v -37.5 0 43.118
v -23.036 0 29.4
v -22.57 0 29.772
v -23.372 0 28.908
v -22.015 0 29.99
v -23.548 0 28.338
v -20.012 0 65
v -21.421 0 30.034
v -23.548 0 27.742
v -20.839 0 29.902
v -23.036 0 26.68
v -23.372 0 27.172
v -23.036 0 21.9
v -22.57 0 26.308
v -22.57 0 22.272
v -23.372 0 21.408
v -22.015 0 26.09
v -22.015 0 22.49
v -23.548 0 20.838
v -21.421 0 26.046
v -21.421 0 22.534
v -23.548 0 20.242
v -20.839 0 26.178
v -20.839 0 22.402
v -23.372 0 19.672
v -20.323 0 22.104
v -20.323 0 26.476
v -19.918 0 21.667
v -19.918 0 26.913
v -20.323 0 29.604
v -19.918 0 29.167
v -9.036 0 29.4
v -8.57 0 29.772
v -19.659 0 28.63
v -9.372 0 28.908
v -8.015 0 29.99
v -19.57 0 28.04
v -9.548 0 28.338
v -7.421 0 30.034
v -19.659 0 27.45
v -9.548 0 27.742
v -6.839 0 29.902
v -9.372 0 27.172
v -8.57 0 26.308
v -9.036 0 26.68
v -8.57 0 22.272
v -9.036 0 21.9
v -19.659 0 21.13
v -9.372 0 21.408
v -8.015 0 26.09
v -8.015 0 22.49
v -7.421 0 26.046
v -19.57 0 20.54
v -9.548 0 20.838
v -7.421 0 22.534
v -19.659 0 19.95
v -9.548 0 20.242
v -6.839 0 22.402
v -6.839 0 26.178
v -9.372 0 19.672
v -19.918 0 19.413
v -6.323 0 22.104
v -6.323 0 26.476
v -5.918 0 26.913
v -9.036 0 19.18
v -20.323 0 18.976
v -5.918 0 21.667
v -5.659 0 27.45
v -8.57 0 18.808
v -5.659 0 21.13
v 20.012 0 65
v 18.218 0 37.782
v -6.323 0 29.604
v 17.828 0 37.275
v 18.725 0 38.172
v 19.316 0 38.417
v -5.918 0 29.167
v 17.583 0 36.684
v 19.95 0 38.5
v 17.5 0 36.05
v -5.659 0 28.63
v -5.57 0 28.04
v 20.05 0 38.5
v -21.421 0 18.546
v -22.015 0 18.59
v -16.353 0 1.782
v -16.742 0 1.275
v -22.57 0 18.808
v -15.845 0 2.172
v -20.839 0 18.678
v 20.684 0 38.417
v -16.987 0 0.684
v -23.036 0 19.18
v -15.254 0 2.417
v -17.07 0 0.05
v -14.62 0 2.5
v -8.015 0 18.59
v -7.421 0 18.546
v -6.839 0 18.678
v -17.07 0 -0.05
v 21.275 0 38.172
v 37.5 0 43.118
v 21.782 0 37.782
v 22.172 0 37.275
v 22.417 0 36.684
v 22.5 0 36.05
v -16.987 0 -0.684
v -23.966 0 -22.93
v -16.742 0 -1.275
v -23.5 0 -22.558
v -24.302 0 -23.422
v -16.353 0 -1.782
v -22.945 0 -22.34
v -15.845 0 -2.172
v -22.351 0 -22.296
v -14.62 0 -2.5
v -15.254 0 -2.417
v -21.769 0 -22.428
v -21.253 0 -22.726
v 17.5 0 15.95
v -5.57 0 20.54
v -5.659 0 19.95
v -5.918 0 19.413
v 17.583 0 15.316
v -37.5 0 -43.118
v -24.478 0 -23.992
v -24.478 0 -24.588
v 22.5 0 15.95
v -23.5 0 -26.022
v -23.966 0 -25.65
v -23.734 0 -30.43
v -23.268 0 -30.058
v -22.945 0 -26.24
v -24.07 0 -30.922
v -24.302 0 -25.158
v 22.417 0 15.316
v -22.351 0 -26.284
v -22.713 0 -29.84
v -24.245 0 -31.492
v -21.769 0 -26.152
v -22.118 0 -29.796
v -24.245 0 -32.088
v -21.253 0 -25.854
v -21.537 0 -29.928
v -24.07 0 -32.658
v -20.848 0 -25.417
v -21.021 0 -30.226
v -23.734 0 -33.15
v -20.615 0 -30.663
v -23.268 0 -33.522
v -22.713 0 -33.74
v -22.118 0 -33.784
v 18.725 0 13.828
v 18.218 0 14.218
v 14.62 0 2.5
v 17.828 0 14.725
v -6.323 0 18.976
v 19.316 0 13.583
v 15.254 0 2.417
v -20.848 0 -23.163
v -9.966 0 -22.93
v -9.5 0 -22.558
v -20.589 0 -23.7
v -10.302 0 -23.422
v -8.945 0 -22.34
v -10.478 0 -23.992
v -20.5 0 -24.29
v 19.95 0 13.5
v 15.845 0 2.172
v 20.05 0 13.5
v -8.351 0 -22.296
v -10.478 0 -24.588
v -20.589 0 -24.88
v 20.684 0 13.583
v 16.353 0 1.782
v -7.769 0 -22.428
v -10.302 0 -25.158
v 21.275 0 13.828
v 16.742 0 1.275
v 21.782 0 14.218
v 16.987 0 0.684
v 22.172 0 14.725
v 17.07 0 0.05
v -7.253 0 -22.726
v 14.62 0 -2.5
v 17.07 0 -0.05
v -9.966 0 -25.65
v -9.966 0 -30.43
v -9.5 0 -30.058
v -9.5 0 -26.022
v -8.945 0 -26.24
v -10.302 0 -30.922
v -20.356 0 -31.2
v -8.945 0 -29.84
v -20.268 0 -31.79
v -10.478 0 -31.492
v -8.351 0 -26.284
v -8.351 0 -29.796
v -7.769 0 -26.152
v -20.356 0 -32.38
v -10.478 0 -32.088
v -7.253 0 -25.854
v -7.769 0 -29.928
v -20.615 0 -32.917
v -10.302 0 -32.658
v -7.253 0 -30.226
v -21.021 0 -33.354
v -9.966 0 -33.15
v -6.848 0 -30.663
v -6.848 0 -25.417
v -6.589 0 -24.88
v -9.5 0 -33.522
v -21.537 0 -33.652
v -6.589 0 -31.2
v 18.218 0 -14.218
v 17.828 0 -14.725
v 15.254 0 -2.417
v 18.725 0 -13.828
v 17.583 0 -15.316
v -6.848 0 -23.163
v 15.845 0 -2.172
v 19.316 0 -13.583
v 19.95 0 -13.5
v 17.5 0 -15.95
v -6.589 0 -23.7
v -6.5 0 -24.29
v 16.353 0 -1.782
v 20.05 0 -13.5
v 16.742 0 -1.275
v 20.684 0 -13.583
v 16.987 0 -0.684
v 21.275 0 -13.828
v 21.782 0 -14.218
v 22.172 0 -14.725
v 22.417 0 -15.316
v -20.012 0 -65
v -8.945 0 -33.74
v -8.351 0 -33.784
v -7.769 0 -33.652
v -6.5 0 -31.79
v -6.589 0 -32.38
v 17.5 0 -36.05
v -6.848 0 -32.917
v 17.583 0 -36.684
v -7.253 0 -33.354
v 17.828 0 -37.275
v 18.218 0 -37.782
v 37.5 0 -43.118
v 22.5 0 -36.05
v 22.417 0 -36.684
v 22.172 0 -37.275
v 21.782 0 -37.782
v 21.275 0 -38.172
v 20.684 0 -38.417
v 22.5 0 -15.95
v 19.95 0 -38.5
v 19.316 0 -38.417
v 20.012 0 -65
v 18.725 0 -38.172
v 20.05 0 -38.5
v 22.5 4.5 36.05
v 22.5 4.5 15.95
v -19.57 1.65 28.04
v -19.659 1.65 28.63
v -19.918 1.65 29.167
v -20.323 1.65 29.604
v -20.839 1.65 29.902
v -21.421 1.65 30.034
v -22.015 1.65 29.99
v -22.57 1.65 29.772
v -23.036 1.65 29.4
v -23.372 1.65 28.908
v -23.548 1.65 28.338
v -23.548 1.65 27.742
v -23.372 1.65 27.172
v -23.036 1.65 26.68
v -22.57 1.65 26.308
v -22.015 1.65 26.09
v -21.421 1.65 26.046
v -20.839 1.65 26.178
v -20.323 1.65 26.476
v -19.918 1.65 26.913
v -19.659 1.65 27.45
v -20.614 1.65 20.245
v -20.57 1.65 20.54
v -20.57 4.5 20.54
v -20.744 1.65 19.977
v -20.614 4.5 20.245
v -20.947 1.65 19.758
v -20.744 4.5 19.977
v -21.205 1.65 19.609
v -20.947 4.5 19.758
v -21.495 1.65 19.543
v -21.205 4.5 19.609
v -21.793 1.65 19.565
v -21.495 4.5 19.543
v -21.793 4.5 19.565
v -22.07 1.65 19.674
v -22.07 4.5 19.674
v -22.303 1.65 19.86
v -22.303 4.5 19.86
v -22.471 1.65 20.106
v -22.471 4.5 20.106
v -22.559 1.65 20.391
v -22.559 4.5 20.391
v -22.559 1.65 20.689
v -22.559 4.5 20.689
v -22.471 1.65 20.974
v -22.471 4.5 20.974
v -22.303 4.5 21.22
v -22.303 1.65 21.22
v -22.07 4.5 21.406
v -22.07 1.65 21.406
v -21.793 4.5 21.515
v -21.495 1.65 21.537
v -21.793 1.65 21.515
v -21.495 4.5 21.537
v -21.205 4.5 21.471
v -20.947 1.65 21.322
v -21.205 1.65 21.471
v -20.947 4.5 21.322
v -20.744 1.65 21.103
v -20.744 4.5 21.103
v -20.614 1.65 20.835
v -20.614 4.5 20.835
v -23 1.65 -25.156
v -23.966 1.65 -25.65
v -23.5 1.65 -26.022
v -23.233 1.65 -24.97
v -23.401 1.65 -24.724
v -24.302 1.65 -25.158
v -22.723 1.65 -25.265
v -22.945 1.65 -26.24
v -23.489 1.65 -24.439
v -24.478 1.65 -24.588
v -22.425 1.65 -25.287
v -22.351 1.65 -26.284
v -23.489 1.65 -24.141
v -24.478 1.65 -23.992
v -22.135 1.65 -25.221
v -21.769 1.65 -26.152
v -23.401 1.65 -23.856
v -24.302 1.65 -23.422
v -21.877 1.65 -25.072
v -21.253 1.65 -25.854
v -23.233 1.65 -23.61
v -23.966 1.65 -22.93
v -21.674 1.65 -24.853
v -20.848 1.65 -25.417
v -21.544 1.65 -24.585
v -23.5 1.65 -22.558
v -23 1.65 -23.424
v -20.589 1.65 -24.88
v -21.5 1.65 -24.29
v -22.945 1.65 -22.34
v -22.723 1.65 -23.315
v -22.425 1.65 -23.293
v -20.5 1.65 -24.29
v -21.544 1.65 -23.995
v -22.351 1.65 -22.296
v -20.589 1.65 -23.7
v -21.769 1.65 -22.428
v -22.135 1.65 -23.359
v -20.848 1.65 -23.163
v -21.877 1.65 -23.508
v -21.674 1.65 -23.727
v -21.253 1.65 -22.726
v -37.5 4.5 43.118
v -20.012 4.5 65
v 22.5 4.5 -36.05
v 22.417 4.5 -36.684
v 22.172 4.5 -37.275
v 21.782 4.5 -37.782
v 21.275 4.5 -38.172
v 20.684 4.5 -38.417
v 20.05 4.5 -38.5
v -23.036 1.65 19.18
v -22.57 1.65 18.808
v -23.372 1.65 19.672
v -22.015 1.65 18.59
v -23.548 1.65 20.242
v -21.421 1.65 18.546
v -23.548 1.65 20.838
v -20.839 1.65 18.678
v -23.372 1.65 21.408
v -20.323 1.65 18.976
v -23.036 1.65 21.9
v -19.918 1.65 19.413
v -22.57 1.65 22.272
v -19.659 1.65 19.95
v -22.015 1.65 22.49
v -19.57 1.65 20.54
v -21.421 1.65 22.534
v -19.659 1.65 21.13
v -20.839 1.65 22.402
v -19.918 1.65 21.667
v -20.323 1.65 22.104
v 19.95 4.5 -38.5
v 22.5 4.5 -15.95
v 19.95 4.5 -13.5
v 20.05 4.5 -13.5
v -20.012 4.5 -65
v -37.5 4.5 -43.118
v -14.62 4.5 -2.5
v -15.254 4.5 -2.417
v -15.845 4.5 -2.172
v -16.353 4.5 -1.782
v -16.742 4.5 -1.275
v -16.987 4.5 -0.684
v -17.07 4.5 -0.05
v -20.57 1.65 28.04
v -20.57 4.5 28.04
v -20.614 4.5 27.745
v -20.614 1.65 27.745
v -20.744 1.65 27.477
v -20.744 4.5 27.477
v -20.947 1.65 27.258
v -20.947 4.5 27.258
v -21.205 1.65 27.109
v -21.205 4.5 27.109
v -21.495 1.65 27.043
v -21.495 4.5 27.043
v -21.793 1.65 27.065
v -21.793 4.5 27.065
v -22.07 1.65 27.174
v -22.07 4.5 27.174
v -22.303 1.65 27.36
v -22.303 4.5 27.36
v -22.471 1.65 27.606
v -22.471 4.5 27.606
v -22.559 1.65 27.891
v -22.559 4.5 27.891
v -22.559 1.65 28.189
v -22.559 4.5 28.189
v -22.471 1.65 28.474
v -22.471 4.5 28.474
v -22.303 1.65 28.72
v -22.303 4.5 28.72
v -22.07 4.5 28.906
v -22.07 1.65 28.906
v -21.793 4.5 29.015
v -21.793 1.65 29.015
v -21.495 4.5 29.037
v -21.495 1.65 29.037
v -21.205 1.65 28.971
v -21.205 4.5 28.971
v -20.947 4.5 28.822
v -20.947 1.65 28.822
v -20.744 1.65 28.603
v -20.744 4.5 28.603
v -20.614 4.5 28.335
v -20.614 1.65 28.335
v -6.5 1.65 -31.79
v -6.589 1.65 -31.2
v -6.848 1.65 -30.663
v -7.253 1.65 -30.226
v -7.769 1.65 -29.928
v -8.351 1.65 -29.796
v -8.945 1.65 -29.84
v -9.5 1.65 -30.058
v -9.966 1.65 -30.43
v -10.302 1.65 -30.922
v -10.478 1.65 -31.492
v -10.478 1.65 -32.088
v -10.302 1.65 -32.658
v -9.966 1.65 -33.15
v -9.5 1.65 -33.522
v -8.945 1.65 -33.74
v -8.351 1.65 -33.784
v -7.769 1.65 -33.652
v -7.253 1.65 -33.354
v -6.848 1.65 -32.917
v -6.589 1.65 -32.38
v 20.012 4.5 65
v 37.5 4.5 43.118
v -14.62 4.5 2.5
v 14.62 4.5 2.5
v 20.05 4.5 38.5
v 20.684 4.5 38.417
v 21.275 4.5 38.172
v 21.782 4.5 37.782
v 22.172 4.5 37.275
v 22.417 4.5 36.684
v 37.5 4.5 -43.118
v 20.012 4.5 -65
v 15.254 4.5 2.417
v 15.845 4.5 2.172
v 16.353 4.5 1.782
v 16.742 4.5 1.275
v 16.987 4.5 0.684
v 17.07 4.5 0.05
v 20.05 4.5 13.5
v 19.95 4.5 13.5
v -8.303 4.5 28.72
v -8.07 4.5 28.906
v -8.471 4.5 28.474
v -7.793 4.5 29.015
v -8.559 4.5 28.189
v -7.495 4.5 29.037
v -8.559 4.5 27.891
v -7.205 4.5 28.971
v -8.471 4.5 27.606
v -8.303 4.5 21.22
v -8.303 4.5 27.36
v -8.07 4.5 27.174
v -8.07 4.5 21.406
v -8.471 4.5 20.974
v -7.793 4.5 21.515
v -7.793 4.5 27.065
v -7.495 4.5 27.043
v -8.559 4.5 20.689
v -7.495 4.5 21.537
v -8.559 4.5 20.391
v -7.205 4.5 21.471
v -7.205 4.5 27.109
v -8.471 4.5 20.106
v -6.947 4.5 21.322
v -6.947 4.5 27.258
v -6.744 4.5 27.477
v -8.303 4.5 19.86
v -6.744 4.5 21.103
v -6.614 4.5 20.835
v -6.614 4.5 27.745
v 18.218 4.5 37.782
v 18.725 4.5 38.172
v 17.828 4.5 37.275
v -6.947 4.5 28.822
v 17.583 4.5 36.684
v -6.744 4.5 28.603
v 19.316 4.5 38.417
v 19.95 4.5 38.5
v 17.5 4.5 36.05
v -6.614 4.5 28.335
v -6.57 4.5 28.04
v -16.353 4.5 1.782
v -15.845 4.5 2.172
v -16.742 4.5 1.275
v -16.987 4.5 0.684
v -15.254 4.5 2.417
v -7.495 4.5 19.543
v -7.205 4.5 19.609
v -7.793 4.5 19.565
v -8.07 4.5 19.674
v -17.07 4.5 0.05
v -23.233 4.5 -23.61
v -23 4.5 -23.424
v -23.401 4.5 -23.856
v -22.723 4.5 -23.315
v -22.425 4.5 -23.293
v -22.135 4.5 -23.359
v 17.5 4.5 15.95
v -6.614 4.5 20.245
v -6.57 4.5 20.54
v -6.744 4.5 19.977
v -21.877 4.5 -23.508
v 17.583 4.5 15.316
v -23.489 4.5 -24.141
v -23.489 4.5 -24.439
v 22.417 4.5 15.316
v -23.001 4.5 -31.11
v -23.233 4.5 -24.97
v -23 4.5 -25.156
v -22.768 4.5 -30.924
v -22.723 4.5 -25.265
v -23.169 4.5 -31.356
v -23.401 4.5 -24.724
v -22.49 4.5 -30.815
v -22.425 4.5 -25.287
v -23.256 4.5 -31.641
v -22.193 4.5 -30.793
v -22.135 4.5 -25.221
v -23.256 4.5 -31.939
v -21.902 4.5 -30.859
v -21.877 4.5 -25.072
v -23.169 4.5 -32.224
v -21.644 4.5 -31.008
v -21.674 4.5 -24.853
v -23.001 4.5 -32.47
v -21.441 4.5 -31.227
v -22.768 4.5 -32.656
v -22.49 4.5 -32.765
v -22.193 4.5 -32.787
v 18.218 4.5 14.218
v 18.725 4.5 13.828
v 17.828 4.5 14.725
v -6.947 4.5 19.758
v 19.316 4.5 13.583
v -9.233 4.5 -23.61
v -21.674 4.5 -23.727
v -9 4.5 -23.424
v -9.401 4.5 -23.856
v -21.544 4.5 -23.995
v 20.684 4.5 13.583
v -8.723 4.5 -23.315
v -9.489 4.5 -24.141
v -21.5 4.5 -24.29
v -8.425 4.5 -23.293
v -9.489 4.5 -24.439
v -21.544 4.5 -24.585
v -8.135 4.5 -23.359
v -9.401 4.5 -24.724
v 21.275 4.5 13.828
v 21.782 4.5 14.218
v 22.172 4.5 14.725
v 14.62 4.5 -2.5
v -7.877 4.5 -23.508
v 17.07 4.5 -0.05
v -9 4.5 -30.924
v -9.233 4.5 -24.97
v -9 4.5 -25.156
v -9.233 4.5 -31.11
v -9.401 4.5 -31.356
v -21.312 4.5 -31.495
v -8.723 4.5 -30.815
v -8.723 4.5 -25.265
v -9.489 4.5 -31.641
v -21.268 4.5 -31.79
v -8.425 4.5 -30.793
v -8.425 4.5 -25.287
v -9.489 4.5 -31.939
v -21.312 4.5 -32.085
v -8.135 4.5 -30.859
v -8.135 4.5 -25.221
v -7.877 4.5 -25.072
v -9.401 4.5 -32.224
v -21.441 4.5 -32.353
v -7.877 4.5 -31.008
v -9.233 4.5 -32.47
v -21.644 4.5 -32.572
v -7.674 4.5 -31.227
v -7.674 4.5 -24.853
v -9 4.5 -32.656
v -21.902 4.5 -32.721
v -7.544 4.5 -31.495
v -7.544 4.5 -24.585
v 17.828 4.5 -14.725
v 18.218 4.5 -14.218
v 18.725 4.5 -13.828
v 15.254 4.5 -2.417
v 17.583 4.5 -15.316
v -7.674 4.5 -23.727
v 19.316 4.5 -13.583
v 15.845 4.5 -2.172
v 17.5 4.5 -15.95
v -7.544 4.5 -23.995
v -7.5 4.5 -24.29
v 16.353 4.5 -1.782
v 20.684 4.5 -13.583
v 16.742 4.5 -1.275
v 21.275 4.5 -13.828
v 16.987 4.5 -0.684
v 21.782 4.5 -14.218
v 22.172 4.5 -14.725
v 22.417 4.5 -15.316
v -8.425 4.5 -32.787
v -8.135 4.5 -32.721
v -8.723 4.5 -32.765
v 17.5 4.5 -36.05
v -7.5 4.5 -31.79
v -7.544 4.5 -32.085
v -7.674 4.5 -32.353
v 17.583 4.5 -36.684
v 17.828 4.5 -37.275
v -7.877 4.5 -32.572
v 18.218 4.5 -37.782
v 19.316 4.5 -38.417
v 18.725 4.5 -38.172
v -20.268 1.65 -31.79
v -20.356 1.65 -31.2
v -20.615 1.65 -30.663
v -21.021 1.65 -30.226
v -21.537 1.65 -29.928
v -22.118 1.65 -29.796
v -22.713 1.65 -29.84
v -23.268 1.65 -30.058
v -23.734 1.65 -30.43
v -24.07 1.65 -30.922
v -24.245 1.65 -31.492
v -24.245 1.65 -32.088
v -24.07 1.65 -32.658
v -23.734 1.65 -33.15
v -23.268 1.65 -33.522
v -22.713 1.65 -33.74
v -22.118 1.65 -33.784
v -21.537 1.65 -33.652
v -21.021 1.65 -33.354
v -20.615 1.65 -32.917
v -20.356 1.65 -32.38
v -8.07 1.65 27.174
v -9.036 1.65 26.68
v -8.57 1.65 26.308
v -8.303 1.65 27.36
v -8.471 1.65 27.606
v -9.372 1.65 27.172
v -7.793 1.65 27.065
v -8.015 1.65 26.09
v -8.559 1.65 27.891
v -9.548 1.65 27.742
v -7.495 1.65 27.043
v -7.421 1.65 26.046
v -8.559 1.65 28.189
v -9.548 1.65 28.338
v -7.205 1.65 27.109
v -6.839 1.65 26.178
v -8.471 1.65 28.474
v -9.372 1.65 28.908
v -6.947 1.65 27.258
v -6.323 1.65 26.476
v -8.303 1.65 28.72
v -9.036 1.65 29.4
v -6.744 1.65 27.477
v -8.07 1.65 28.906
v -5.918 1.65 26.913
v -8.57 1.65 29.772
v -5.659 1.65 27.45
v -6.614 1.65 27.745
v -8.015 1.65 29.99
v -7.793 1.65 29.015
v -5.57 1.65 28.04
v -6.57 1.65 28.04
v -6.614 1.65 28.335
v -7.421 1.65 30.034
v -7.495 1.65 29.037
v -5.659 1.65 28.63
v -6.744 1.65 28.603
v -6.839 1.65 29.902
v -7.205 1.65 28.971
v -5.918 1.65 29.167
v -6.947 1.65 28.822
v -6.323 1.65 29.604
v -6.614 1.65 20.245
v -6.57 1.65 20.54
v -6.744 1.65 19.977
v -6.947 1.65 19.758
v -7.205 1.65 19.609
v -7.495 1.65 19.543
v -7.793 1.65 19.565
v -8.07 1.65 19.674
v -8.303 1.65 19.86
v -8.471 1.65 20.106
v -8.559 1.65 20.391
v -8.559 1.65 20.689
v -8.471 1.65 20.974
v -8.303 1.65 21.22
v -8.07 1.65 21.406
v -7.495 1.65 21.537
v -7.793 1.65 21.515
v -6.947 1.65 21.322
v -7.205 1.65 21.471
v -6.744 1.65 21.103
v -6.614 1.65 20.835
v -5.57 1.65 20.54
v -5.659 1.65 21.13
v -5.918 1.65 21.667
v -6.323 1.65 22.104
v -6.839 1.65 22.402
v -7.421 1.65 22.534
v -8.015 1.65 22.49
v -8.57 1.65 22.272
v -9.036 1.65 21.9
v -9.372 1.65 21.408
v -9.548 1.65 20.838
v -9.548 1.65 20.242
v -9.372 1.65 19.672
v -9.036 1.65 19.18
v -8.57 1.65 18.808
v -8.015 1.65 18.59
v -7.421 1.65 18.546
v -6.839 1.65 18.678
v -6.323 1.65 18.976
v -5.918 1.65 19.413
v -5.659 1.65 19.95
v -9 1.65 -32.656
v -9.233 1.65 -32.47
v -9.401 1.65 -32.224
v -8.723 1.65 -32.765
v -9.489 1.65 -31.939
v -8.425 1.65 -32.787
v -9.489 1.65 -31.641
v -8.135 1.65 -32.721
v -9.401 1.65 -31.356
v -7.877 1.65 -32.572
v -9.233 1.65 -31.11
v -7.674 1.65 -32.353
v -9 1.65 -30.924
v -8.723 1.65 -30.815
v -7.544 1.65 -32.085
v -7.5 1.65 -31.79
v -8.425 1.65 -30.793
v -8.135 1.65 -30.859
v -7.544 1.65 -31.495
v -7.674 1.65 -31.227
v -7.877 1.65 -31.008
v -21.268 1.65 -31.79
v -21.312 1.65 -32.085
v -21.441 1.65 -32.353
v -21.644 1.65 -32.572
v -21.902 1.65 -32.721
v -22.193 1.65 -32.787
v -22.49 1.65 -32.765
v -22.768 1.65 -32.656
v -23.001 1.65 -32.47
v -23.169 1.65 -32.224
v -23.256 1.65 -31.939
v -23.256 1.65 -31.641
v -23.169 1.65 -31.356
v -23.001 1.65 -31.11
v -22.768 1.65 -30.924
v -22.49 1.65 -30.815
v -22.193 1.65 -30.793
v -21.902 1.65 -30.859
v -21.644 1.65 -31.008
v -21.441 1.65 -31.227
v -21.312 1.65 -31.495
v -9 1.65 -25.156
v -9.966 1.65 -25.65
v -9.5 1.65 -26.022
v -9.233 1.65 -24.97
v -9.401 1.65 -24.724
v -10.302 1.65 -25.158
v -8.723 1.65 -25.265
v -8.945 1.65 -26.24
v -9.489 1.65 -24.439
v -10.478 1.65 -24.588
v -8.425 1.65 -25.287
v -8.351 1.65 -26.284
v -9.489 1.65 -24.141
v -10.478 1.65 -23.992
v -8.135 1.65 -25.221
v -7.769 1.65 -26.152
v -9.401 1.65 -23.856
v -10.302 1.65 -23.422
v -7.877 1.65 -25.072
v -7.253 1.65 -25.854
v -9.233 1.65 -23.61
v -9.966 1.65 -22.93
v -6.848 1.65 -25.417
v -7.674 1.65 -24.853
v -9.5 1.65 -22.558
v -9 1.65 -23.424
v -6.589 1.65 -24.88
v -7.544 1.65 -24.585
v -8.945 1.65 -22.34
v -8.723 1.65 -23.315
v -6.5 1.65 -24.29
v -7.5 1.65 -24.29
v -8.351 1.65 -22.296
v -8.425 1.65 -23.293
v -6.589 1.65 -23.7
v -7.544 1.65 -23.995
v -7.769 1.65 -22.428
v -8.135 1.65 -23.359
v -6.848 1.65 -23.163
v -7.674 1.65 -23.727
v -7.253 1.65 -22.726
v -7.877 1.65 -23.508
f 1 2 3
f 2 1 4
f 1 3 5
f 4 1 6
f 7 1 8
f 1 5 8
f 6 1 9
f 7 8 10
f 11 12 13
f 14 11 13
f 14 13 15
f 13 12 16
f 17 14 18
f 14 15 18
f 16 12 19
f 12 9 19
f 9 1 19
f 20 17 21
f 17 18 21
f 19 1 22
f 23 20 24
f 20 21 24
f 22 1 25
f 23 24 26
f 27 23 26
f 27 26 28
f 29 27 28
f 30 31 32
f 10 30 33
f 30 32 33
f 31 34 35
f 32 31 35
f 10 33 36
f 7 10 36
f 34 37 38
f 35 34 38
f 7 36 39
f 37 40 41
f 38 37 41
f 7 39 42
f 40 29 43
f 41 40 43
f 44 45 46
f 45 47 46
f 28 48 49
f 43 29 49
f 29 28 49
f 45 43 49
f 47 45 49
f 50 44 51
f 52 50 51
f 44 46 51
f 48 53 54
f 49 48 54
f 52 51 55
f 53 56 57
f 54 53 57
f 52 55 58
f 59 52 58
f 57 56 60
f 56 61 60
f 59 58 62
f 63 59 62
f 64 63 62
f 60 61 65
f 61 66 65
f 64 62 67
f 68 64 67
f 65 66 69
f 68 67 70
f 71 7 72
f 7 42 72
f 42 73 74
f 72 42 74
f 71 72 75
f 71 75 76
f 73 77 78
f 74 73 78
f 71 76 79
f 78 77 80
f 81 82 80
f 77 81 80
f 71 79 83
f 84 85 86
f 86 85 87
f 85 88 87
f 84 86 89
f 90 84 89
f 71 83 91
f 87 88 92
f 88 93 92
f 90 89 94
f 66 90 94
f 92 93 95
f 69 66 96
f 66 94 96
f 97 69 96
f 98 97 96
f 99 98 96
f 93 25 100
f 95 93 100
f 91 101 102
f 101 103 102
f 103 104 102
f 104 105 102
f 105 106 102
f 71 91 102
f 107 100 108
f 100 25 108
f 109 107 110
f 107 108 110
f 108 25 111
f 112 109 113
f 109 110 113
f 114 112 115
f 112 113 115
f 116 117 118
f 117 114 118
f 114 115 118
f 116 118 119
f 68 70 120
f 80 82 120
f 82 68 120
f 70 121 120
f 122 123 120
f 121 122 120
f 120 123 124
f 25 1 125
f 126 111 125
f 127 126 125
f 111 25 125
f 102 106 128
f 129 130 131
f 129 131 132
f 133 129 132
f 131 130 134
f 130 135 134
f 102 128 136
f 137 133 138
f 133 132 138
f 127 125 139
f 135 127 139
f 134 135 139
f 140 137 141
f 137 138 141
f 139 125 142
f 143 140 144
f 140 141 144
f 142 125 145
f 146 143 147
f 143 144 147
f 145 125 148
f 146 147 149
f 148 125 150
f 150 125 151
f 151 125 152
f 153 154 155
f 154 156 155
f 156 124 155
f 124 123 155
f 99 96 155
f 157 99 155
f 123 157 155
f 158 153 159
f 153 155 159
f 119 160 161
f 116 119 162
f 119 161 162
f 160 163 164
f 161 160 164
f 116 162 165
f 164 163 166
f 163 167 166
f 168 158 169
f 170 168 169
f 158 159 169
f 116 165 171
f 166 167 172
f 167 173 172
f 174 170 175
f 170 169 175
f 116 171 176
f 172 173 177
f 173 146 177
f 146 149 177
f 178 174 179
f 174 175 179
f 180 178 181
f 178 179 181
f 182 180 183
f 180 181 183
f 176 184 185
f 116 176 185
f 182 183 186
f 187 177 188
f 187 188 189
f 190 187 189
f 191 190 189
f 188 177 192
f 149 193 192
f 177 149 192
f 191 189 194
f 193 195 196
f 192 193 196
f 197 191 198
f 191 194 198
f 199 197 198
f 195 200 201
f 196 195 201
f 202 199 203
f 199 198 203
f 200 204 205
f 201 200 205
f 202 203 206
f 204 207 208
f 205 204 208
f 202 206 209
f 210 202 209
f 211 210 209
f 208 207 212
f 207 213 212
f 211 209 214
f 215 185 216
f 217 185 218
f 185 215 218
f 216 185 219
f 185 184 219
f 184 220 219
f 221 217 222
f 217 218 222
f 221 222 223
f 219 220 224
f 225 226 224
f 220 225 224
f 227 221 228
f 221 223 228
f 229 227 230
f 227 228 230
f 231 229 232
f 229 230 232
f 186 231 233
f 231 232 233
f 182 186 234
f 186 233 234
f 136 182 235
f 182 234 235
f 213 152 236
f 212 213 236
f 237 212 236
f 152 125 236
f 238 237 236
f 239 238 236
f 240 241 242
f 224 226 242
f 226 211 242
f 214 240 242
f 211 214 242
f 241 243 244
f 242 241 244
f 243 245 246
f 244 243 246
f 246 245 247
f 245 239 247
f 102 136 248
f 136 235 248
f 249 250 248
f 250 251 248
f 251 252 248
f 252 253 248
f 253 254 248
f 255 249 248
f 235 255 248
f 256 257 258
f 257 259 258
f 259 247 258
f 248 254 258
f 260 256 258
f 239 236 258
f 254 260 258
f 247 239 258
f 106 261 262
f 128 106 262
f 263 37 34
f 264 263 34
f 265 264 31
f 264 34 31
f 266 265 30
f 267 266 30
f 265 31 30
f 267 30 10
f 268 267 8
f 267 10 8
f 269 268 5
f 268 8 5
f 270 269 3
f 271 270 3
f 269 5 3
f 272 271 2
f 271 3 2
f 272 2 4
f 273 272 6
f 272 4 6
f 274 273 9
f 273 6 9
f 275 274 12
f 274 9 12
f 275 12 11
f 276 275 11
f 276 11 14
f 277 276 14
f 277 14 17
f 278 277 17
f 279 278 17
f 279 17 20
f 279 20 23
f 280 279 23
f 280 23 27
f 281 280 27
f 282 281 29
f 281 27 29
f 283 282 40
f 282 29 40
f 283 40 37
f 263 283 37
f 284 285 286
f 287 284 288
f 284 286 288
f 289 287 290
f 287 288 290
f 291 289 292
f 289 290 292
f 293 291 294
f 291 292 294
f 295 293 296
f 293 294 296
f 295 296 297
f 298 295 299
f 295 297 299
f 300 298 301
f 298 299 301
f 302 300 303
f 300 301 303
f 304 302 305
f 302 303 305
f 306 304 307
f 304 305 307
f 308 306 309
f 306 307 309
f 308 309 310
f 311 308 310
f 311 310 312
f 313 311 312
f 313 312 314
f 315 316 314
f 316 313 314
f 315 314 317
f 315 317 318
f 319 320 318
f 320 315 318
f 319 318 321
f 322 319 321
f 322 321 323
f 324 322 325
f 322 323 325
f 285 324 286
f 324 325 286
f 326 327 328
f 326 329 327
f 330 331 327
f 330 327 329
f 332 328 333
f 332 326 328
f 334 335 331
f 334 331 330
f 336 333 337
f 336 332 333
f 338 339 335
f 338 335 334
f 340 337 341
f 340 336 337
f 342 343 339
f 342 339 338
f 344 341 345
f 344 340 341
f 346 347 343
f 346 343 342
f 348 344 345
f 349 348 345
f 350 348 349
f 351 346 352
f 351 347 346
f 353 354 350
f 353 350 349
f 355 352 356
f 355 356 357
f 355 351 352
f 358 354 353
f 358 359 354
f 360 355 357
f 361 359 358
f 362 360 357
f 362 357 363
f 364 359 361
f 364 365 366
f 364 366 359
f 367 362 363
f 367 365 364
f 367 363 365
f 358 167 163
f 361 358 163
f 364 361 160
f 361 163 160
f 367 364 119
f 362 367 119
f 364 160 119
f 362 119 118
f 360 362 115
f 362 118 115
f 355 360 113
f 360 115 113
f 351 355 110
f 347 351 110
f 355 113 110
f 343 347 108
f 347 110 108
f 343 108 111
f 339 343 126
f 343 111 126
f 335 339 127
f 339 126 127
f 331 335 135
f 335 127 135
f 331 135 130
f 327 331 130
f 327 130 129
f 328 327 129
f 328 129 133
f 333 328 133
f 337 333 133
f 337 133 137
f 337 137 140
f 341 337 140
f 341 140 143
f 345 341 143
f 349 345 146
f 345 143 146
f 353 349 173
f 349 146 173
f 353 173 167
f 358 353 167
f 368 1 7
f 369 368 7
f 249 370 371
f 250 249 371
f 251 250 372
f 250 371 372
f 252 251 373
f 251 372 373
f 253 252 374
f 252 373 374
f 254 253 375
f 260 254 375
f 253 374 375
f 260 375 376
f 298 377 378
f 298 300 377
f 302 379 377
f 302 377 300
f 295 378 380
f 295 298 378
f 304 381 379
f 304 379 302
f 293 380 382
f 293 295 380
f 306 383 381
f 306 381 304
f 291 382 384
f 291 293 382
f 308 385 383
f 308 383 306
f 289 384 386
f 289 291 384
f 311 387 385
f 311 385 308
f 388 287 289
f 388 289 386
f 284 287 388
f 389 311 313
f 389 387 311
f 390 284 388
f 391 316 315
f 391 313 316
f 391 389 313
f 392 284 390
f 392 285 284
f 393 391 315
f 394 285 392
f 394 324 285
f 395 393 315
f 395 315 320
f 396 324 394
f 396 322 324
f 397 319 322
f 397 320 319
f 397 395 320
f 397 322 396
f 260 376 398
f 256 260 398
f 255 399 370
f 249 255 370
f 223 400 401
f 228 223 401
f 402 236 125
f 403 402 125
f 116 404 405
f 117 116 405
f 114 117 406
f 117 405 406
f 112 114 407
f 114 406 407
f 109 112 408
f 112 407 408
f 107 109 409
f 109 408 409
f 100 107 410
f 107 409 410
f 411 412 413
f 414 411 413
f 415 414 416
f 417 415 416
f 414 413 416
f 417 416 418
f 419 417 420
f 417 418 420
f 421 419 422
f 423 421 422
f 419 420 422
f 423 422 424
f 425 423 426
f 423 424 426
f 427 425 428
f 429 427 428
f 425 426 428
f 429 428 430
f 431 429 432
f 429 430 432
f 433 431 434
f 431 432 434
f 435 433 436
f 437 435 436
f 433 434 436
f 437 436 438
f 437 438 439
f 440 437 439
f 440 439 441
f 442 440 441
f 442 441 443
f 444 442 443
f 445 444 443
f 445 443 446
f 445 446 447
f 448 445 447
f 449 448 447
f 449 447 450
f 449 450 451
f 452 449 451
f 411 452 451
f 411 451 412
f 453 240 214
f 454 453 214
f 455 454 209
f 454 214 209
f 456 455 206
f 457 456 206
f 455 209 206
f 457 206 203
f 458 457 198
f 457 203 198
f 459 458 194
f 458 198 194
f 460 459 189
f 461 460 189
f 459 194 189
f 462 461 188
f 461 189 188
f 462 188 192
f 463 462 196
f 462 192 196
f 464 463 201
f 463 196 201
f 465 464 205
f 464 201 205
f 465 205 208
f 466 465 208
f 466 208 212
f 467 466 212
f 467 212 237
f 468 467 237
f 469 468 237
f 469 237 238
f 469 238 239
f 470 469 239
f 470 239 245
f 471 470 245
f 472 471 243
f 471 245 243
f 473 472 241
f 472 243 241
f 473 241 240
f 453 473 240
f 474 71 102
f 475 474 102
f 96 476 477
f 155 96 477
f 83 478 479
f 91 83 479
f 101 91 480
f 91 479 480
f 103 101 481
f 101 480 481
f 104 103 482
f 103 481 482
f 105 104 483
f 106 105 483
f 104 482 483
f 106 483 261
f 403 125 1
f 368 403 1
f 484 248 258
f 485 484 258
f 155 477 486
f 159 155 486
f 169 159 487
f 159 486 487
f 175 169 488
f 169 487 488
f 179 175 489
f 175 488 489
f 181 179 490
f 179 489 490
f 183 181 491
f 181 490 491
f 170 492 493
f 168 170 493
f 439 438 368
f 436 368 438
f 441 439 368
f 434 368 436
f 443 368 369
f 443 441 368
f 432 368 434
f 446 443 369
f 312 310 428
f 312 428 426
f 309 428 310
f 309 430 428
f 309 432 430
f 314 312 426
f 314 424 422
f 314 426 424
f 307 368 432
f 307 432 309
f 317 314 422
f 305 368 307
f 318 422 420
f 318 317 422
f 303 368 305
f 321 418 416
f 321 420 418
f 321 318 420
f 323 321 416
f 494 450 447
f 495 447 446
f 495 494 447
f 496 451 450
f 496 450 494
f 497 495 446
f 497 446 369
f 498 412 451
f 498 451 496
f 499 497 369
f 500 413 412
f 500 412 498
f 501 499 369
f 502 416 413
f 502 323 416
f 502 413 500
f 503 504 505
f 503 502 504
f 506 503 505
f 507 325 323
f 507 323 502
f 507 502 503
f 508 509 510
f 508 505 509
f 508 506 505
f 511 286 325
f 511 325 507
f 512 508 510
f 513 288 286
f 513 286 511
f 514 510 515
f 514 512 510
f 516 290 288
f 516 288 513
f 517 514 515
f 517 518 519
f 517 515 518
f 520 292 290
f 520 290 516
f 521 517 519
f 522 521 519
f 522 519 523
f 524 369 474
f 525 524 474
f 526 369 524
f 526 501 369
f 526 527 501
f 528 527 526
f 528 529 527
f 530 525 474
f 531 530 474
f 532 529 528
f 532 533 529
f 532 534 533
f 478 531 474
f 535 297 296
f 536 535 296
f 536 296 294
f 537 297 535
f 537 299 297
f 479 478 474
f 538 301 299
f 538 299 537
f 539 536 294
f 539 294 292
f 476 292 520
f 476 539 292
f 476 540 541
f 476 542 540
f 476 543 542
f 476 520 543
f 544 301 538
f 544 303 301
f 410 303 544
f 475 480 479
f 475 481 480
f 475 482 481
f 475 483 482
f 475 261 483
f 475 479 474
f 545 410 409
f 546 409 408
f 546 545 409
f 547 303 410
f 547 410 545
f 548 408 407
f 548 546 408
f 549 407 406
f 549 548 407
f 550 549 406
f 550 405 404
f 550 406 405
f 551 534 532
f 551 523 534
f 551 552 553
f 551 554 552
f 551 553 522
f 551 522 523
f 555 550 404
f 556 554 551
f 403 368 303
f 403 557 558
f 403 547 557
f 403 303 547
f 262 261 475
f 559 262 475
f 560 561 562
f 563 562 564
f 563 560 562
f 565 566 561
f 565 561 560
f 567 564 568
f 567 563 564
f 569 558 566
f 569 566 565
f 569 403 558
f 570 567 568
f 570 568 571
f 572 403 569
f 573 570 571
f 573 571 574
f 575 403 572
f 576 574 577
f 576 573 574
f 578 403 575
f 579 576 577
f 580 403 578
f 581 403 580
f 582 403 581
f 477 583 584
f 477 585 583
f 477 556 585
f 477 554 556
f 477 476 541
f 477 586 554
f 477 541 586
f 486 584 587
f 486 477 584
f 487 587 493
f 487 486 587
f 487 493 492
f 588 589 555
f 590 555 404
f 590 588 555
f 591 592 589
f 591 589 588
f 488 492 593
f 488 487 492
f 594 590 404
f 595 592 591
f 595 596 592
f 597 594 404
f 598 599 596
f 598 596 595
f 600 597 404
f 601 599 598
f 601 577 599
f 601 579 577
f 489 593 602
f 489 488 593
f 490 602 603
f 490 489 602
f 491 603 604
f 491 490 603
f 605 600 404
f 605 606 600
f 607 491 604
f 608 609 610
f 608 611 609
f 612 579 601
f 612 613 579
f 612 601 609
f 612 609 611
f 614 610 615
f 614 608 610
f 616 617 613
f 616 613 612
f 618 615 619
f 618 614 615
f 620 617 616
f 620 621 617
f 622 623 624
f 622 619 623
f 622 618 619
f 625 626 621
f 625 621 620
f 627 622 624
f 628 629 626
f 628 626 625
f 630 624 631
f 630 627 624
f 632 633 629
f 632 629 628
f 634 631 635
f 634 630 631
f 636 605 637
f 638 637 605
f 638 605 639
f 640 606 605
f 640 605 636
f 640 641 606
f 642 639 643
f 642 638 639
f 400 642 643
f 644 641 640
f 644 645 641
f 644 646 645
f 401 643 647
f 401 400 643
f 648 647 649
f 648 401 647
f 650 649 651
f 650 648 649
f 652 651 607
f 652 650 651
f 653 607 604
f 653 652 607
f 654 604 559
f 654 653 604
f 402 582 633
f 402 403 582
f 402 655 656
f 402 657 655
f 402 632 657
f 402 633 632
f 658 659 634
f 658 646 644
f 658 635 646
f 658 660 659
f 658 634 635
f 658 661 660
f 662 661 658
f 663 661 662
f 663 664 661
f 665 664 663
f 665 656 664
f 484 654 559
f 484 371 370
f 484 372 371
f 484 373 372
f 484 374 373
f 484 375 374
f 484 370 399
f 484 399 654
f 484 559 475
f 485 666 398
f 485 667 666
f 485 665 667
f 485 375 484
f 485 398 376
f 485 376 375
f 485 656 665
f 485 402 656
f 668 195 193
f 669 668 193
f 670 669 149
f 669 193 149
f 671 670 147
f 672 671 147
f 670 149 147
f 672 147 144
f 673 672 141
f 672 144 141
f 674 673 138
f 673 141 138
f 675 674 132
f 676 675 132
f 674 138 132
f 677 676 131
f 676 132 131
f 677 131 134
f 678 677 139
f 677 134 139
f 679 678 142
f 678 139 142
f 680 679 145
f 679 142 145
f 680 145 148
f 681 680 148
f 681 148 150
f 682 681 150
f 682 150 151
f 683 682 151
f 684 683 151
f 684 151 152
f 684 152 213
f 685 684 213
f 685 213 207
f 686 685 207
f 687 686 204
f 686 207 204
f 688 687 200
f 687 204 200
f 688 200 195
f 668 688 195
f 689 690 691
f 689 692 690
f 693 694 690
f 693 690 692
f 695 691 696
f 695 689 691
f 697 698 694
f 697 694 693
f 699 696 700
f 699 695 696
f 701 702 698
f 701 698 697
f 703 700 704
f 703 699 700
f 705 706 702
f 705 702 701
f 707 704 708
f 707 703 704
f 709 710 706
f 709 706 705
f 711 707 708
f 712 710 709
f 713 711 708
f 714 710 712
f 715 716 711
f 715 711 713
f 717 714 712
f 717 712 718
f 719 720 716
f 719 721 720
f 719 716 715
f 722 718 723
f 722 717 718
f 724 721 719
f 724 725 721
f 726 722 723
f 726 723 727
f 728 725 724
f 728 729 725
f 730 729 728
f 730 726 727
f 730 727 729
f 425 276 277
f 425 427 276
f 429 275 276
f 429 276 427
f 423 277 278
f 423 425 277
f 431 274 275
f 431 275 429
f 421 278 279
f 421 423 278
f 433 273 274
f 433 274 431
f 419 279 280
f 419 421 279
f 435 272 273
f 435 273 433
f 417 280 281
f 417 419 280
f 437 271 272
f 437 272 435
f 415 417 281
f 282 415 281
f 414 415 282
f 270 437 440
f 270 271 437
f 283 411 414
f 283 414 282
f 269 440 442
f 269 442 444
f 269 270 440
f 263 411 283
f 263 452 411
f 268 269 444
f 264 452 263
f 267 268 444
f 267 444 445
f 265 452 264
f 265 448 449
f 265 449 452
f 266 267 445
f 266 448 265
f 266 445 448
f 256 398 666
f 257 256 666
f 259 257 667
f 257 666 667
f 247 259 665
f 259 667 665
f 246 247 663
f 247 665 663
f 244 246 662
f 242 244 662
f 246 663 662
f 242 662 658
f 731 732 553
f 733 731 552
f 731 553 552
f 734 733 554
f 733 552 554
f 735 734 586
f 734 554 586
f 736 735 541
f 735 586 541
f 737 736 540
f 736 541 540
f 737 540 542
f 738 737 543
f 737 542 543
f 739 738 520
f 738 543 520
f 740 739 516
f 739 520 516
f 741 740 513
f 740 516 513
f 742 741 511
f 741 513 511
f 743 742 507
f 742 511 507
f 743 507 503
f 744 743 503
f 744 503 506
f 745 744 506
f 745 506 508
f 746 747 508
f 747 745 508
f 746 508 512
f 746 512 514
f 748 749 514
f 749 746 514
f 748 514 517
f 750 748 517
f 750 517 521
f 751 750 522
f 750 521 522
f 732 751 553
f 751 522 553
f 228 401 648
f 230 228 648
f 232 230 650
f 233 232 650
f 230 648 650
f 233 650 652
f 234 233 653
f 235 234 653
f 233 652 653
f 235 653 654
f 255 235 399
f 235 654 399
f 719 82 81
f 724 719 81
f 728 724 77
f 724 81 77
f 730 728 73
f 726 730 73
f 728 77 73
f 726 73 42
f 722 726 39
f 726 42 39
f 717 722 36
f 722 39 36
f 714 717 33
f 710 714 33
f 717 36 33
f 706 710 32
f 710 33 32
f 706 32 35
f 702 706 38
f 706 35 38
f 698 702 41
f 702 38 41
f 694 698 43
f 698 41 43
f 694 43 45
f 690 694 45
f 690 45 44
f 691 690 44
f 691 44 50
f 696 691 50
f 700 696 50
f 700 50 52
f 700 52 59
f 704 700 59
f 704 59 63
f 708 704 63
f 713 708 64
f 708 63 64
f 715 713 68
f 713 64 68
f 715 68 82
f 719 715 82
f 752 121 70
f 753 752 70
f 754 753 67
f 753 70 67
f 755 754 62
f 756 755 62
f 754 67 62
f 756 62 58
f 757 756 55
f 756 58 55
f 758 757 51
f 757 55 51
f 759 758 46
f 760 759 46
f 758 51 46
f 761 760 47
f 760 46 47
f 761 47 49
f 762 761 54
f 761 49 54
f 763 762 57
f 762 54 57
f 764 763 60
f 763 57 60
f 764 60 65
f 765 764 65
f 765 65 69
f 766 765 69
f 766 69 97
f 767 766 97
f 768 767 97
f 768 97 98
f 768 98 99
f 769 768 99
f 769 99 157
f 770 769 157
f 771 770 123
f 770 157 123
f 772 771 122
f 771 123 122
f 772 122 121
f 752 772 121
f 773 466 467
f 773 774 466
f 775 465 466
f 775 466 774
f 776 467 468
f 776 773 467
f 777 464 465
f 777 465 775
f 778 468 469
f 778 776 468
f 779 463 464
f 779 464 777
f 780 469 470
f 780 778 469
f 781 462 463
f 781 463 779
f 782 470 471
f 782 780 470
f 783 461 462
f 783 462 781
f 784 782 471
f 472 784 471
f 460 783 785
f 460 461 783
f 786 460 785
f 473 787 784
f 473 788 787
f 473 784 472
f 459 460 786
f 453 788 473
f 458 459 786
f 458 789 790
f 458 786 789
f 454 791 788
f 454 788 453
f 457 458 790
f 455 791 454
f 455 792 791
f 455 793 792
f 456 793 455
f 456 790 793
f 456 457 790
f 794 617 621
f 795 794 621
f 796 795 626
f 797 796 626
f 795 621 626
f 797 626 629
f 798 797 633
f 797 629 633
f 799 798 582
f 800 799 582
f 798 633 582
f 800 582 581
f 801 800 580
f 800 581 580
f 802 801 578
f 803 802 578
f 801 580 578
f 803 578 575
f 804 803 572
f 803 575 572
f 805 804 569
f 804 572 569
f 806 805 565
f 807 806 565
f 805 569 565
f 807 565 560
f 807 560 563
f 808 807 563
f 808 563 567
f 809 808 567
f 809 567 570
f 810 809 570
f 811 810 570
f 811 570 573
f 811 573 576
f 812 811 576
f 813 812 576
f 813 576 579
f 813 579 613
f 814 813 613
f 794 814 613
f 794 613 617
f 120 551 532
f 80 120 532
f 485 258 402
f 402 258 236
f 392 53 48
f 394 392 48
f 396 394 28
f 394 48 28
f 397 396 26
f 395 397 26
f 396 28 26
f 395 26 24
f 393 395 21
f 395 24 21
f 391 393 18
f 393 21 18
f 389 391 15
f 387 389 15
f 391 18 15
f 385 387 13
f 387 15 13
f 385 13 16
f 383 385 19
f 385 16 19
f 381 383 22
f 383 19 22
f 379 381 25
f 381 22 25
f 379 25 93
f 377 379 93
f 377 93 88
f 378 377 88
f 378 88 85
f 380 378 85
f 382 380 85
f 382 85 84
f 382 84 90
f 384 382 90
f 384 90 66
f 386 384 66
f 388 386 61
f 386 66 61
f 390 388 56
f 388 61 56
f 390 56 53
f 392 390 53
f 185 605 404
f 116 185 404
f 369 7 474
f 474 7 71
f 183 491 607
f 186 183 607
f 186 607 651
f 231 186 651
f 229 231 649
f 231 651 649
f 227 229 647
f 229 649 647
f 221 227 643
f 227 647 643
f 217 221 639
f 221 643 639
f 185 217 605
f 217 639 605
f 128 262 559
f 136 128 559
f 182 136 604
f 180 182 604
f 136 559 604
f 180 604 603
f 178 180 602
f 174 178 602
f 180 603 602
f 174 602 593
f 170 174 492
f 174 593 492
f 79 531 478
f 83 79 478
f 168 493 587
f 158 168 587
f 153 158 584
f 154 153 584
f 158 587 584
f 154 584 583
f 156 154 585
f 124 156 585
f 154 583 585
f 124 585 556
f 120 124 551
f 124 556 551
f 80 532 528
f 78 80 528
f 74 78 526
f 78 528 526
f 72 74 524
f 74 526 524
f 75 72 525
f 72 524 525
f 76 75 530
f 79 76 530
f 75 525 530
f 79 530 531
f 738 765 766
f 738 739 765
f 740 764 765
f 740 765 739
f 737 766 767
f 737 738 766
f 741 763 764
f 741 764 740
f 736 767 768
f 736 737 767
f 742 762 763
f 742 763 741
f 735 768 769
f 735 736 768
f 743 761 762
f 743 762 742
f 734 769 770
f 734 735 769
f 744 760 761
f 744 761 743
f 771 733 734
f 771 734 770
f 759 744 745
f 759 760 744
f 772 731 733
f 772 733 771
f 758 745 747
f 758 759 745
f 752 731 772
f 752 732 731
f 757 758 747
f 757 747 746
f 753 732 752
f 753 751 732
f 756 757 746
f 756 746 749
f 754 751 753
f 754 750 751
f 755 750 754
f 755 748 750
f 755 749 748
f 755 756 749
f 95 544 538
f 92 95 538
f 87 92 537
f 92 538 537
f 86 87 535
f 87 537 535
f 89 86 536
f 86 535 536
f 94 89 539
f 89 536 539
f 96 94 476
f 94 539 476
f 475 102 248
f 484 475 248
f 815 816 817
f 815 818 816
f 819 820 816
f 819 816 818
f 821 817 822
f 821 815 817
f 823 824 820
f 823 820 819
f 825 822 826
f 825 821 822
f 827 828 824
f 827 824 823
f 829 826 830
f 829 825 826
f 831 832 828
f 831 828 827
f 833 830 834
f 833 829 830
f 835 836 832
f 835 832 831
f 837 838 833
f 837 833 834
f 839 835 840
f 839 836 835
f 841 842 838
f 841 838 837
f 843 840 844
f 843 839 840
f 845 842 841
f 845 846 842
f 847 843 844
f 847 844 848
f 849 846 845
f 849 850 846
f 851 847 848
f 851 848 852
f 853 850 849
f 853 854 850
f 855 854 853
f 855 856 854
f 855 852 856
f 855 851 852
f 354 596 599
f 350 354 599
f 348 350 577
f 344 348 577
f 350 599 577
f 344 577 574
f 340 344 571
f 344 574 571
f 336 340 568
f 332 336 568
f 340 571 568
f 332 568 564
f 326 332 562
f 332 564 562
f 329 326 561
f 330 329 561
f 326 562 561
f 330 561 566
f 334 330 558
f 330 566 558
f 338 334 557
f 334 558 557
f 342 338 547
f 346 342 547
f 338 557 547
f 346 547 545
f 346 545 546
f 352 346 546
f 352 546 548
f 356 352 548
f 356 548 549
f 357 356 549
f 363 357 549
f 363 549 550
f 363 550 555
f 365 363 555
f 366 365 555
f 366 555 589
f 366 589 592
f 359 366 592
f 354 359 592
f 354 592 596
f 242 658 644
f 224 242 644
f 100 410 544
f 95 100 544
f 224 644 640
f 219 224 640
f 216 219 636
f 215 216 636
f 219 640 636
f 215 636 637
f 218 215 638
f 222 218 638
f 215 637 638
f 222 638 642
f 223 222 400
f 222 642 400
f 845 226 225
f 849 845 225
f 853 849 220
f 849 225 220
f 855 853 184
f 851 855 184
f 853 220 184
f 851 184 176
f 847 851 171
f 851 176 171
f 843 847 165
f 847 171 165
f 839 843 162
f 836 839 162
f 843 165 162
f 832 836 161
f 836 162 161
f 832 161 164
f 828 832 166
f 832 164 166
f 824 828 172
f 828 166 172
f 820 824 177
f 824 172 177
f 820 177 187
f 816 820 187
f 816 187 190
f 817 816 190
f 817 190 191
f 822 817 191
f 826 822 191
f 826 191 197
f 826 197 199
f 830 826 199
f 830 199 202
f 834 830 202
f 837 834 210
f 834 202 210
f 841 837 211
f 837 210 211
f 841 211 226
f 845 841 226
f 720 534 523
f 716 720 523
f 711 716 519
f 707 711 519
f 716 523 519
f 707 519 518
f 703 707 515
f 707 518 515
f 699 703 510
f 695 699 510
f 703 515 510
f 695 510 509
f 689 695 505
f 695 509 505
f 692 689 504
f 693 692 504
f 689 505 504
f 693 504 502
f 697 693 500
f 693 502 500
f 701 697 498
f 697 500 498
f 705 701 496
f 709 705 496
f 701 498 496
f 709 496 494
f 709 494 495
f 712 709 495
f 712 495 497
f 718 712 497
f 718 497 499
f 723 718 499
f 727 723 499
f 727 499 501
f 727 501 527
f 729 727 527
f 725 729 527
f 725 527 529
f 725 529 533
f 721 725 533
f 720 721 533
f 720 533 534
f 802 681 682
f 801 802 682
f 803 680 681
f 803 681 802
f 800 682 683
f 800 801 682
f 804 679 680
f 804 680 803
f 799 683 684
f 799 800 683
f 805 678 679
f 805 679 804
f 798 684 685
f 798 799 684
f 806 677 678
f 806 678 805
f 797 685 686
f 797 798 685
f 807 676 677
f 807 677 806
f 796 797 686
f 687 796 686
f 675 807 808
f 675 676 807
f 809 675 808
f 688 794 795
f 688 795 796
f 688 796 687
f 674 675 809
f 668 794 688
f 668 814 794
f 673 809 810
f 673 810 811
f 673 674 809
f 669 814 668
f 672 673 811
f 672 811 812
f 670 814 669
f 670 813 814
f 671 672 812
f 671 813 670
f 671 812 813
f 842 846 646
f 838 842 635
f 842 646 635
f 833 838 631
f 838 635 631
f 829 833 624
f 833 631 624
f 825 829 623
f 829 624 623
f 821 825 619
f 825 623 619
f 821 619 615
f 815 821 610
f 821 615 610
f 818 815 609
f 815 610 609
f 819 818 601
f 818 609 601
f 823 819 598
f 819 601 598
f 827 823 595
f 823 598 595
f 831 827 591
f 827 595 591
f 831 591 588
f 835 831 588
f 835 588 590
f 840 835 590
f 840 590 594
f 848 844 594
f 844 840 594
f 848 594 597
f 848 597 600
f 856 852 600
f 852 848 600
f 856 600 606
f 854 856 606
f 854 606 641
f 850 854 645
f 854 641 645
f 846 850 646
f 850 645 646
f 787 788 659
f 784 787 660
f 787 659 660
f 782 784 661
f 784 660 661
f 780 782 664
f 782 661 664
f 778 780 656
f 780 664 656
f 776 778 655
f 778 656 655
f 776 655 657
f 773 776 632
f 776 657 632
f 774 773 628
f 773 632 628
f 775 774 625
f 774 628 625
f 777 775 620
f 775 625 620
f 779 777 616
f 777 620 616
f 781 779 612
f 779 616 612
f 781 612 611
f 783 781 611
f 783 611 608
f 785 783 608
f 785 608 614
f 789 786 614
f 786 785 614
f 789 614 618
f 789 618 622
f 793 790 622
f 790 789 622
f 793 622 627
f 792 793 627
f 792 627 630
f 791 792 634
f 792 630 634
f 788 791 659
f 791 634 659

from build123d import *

# Parameters (mm, degrees)
BOSS_EXTRUDE1_DEPTH = 4.5
CUT_EXTRUDE2_DEPTH  = 10
SKETCH7_R           = 1
CUT_EXTRUDE3_DEPTH  = 5
SKETCH11_R          = 2
SKETCH11_R_2        = 1
CUT_EXTRUDE4_DEPTH  = 1.65


with BuildPart() as part:
    # Sketch1 → Boss-Extrude1 (new body)
    with BuildSketch(Plane(origin=(0, 0, 0), x_dir=(1, 0, 0), z_dir=(0, 1, 0))):
        Polygon((-37.5, -43.117707706), (-20.011895516, -65), (20.011895516, -65), (37.5, -43.117707706), (37.5, 43.117707706), (20.011895516, 65), (-20.011895516, 65), (-37.5, 43.117707706), align=None)
    extrude(amount=BOSS_EXTRUDE1_DEPTH)

    # Sketch5 → Cut-Extrude2 (cut)
    with BuildSketch(Plane(origin=(0, 4.5, 0), x_dir=(1, 0, 0), z_dir=(0, 1, 0))):
        with BuildLine():
            Line((-14.620176413, -2.5), (14.620176413, -2.5))
            ThreePointArc((14.620176413, -2.5), (16.352588027, -1.782411614), (17.070176413, -0.05))
            Line((17.070176413, -0.05), (17.070176413, 0.05))
            ThreePointArc((17.070176413, 0.05), (16.352588027, 1.782411614), (14.620176413, 2.5))
            Line((14.620176413, 2.5), (-14.620176413, 2.5))
            ThreePointArc((-14.620176413, 2.5), (-16.352588027, 1.782411614), (-17.070176413, 0.05))
            Line((-17.070176413, 0.05), (-17.070176413, -0.05))
            ThreePointArc((-17.070176413, -0.05), (-16.352588027, -1.782411614), (-14.620176413, -2.5))
        make_face()
        with BuildLine():
            Line((19.95, -38.5), (20.05, -38.5))
            ThreePointArc((20.05, -38.5), (21.782411614, -37.782411614), (22.5, -36.05))
            Line((22.5, -36.05), (22.5, -15.95))
            ThreePointArc((22.5, -15.95), (21.782411614, -14.217588386), (20.05, -13.5))
            Line((20.05, -13.5), (19.95, -13.5))
            ThreePointArc((19.95, -13.5), (18.217588386, -14.217588386), (17.5, -15.95))
            Line((17.5, -15.95), (17.5, -36.05))
            ThreePointArc((17.5, -36.05), (18.217588386, -37.782411614), (19.95, -38.5))
        make_face()
        with BuildLine():
            Line((19.95, 13.5), (20.05, 13.5))
            ThreePointArc((20.05, 13.5), (21.782411614, 14.217588386), (22.5, 15.95))
            Line((22.5, 15.95), (22.5, 36.05))
            ThreePointArc((22.5, 36.05), (21.782411614, 37.782411614), (20.05, 38.5))
            Line((20.05, 38.5), (19.95, 38.5))
            ThreePointArc((19.95, 38.5), (18.217588386, 37.782411614), (17.5, 36.05))
            Line((17.5, 36.05), (17.5, 15.95))
            ThreePointArc((17.5, 15.95), (18.217588386, 14.217588386), (19.95, 13.5))
        make_face()
    extrude(amount=-CUT_EXTRUDE2_DEPTH, mode=Mode.SUBTRACT)

    # Sketch7 → Cut-Extrude3 (cut)
    with BuildSketch(Plane(origin=(0, 4.5, 0), x_dir=(1, 0, 0), z_dir=(0, 1, 0))):
        with Locations((-8.5, 24.29)):
            Circle(SKETCH7_R)
        with Locations((-22.5, 24.29)):
            Circle(SKETCH7_R)
        with Locations((-22.26760758, 31.79)):
            Circle(SKETCH7_R)
        with Locations((-21.57, -20.54)):
            Circle(SKETCH7_R)
        with Locations((-21.57, -28.04)):
            Circle(SKETCH7_R)
        with Locations((-7.57, -28.04)):
            Circle(SKETCH7_R)
        with Locations((-7.57, -20.54)):
            Circle(SKETCH7_R)
        with Locations((-8.5, 31.79)):
            Circle(SKETCH7_R)
    extrude(amount=-CUT_EXTRUDE3_DEPTH, mode=Mode.SUBTRACT)

    # Sketch11 → Cut-Extrude4 (cut)
    with BuildSketch(Plane.XZ):
        with Locations((-7.57, 20.54)):
            Circle(SKETCH11_R)
        with Locations((-7.57, 20.54)):
            Circle(SKETCH11_R_2, mode=Mode.SUBTRACT)
        with Locations((-21.57, 20.54)):
            Circle(SKETCH11_R)
        with Locations((-21.57, 20.54)):
            Circle(SKETCH11_R_2, mode=Mode.SUBTRACT)
        with Locations((-8.5, -24.29)):
            Circle(SKETCH11_R)
        with Locations((-8.5, -24.29)):
            Circle(SKETCH11_R_2, mode=Mode.SUBTRACT)
        with Locations((-8.5, -31.79)):
            Circle(SKETCH11_R)
        with Locations((-8.5, -31.79)):
            Circle(SKETCH11_R_2, mode=Mode.SUBTRACT)
        with Locations((-7.57, 28.04)):
            Circle(SKETCH11_R)
        with Locations((-21.57, 28.04)):
            Circle(SKETCH11_R)
        with Locations((-22.26760758, -31.79)):
            Circle(SKETCH11_R)
        with Locations((-22.5, -24.29)):
            Circle(SKETCH11_R)
    extrude(amount=-CUT_EXTRUDE4_DEPTH, mode=Mode.SUBTRACT)


solid = part.part
